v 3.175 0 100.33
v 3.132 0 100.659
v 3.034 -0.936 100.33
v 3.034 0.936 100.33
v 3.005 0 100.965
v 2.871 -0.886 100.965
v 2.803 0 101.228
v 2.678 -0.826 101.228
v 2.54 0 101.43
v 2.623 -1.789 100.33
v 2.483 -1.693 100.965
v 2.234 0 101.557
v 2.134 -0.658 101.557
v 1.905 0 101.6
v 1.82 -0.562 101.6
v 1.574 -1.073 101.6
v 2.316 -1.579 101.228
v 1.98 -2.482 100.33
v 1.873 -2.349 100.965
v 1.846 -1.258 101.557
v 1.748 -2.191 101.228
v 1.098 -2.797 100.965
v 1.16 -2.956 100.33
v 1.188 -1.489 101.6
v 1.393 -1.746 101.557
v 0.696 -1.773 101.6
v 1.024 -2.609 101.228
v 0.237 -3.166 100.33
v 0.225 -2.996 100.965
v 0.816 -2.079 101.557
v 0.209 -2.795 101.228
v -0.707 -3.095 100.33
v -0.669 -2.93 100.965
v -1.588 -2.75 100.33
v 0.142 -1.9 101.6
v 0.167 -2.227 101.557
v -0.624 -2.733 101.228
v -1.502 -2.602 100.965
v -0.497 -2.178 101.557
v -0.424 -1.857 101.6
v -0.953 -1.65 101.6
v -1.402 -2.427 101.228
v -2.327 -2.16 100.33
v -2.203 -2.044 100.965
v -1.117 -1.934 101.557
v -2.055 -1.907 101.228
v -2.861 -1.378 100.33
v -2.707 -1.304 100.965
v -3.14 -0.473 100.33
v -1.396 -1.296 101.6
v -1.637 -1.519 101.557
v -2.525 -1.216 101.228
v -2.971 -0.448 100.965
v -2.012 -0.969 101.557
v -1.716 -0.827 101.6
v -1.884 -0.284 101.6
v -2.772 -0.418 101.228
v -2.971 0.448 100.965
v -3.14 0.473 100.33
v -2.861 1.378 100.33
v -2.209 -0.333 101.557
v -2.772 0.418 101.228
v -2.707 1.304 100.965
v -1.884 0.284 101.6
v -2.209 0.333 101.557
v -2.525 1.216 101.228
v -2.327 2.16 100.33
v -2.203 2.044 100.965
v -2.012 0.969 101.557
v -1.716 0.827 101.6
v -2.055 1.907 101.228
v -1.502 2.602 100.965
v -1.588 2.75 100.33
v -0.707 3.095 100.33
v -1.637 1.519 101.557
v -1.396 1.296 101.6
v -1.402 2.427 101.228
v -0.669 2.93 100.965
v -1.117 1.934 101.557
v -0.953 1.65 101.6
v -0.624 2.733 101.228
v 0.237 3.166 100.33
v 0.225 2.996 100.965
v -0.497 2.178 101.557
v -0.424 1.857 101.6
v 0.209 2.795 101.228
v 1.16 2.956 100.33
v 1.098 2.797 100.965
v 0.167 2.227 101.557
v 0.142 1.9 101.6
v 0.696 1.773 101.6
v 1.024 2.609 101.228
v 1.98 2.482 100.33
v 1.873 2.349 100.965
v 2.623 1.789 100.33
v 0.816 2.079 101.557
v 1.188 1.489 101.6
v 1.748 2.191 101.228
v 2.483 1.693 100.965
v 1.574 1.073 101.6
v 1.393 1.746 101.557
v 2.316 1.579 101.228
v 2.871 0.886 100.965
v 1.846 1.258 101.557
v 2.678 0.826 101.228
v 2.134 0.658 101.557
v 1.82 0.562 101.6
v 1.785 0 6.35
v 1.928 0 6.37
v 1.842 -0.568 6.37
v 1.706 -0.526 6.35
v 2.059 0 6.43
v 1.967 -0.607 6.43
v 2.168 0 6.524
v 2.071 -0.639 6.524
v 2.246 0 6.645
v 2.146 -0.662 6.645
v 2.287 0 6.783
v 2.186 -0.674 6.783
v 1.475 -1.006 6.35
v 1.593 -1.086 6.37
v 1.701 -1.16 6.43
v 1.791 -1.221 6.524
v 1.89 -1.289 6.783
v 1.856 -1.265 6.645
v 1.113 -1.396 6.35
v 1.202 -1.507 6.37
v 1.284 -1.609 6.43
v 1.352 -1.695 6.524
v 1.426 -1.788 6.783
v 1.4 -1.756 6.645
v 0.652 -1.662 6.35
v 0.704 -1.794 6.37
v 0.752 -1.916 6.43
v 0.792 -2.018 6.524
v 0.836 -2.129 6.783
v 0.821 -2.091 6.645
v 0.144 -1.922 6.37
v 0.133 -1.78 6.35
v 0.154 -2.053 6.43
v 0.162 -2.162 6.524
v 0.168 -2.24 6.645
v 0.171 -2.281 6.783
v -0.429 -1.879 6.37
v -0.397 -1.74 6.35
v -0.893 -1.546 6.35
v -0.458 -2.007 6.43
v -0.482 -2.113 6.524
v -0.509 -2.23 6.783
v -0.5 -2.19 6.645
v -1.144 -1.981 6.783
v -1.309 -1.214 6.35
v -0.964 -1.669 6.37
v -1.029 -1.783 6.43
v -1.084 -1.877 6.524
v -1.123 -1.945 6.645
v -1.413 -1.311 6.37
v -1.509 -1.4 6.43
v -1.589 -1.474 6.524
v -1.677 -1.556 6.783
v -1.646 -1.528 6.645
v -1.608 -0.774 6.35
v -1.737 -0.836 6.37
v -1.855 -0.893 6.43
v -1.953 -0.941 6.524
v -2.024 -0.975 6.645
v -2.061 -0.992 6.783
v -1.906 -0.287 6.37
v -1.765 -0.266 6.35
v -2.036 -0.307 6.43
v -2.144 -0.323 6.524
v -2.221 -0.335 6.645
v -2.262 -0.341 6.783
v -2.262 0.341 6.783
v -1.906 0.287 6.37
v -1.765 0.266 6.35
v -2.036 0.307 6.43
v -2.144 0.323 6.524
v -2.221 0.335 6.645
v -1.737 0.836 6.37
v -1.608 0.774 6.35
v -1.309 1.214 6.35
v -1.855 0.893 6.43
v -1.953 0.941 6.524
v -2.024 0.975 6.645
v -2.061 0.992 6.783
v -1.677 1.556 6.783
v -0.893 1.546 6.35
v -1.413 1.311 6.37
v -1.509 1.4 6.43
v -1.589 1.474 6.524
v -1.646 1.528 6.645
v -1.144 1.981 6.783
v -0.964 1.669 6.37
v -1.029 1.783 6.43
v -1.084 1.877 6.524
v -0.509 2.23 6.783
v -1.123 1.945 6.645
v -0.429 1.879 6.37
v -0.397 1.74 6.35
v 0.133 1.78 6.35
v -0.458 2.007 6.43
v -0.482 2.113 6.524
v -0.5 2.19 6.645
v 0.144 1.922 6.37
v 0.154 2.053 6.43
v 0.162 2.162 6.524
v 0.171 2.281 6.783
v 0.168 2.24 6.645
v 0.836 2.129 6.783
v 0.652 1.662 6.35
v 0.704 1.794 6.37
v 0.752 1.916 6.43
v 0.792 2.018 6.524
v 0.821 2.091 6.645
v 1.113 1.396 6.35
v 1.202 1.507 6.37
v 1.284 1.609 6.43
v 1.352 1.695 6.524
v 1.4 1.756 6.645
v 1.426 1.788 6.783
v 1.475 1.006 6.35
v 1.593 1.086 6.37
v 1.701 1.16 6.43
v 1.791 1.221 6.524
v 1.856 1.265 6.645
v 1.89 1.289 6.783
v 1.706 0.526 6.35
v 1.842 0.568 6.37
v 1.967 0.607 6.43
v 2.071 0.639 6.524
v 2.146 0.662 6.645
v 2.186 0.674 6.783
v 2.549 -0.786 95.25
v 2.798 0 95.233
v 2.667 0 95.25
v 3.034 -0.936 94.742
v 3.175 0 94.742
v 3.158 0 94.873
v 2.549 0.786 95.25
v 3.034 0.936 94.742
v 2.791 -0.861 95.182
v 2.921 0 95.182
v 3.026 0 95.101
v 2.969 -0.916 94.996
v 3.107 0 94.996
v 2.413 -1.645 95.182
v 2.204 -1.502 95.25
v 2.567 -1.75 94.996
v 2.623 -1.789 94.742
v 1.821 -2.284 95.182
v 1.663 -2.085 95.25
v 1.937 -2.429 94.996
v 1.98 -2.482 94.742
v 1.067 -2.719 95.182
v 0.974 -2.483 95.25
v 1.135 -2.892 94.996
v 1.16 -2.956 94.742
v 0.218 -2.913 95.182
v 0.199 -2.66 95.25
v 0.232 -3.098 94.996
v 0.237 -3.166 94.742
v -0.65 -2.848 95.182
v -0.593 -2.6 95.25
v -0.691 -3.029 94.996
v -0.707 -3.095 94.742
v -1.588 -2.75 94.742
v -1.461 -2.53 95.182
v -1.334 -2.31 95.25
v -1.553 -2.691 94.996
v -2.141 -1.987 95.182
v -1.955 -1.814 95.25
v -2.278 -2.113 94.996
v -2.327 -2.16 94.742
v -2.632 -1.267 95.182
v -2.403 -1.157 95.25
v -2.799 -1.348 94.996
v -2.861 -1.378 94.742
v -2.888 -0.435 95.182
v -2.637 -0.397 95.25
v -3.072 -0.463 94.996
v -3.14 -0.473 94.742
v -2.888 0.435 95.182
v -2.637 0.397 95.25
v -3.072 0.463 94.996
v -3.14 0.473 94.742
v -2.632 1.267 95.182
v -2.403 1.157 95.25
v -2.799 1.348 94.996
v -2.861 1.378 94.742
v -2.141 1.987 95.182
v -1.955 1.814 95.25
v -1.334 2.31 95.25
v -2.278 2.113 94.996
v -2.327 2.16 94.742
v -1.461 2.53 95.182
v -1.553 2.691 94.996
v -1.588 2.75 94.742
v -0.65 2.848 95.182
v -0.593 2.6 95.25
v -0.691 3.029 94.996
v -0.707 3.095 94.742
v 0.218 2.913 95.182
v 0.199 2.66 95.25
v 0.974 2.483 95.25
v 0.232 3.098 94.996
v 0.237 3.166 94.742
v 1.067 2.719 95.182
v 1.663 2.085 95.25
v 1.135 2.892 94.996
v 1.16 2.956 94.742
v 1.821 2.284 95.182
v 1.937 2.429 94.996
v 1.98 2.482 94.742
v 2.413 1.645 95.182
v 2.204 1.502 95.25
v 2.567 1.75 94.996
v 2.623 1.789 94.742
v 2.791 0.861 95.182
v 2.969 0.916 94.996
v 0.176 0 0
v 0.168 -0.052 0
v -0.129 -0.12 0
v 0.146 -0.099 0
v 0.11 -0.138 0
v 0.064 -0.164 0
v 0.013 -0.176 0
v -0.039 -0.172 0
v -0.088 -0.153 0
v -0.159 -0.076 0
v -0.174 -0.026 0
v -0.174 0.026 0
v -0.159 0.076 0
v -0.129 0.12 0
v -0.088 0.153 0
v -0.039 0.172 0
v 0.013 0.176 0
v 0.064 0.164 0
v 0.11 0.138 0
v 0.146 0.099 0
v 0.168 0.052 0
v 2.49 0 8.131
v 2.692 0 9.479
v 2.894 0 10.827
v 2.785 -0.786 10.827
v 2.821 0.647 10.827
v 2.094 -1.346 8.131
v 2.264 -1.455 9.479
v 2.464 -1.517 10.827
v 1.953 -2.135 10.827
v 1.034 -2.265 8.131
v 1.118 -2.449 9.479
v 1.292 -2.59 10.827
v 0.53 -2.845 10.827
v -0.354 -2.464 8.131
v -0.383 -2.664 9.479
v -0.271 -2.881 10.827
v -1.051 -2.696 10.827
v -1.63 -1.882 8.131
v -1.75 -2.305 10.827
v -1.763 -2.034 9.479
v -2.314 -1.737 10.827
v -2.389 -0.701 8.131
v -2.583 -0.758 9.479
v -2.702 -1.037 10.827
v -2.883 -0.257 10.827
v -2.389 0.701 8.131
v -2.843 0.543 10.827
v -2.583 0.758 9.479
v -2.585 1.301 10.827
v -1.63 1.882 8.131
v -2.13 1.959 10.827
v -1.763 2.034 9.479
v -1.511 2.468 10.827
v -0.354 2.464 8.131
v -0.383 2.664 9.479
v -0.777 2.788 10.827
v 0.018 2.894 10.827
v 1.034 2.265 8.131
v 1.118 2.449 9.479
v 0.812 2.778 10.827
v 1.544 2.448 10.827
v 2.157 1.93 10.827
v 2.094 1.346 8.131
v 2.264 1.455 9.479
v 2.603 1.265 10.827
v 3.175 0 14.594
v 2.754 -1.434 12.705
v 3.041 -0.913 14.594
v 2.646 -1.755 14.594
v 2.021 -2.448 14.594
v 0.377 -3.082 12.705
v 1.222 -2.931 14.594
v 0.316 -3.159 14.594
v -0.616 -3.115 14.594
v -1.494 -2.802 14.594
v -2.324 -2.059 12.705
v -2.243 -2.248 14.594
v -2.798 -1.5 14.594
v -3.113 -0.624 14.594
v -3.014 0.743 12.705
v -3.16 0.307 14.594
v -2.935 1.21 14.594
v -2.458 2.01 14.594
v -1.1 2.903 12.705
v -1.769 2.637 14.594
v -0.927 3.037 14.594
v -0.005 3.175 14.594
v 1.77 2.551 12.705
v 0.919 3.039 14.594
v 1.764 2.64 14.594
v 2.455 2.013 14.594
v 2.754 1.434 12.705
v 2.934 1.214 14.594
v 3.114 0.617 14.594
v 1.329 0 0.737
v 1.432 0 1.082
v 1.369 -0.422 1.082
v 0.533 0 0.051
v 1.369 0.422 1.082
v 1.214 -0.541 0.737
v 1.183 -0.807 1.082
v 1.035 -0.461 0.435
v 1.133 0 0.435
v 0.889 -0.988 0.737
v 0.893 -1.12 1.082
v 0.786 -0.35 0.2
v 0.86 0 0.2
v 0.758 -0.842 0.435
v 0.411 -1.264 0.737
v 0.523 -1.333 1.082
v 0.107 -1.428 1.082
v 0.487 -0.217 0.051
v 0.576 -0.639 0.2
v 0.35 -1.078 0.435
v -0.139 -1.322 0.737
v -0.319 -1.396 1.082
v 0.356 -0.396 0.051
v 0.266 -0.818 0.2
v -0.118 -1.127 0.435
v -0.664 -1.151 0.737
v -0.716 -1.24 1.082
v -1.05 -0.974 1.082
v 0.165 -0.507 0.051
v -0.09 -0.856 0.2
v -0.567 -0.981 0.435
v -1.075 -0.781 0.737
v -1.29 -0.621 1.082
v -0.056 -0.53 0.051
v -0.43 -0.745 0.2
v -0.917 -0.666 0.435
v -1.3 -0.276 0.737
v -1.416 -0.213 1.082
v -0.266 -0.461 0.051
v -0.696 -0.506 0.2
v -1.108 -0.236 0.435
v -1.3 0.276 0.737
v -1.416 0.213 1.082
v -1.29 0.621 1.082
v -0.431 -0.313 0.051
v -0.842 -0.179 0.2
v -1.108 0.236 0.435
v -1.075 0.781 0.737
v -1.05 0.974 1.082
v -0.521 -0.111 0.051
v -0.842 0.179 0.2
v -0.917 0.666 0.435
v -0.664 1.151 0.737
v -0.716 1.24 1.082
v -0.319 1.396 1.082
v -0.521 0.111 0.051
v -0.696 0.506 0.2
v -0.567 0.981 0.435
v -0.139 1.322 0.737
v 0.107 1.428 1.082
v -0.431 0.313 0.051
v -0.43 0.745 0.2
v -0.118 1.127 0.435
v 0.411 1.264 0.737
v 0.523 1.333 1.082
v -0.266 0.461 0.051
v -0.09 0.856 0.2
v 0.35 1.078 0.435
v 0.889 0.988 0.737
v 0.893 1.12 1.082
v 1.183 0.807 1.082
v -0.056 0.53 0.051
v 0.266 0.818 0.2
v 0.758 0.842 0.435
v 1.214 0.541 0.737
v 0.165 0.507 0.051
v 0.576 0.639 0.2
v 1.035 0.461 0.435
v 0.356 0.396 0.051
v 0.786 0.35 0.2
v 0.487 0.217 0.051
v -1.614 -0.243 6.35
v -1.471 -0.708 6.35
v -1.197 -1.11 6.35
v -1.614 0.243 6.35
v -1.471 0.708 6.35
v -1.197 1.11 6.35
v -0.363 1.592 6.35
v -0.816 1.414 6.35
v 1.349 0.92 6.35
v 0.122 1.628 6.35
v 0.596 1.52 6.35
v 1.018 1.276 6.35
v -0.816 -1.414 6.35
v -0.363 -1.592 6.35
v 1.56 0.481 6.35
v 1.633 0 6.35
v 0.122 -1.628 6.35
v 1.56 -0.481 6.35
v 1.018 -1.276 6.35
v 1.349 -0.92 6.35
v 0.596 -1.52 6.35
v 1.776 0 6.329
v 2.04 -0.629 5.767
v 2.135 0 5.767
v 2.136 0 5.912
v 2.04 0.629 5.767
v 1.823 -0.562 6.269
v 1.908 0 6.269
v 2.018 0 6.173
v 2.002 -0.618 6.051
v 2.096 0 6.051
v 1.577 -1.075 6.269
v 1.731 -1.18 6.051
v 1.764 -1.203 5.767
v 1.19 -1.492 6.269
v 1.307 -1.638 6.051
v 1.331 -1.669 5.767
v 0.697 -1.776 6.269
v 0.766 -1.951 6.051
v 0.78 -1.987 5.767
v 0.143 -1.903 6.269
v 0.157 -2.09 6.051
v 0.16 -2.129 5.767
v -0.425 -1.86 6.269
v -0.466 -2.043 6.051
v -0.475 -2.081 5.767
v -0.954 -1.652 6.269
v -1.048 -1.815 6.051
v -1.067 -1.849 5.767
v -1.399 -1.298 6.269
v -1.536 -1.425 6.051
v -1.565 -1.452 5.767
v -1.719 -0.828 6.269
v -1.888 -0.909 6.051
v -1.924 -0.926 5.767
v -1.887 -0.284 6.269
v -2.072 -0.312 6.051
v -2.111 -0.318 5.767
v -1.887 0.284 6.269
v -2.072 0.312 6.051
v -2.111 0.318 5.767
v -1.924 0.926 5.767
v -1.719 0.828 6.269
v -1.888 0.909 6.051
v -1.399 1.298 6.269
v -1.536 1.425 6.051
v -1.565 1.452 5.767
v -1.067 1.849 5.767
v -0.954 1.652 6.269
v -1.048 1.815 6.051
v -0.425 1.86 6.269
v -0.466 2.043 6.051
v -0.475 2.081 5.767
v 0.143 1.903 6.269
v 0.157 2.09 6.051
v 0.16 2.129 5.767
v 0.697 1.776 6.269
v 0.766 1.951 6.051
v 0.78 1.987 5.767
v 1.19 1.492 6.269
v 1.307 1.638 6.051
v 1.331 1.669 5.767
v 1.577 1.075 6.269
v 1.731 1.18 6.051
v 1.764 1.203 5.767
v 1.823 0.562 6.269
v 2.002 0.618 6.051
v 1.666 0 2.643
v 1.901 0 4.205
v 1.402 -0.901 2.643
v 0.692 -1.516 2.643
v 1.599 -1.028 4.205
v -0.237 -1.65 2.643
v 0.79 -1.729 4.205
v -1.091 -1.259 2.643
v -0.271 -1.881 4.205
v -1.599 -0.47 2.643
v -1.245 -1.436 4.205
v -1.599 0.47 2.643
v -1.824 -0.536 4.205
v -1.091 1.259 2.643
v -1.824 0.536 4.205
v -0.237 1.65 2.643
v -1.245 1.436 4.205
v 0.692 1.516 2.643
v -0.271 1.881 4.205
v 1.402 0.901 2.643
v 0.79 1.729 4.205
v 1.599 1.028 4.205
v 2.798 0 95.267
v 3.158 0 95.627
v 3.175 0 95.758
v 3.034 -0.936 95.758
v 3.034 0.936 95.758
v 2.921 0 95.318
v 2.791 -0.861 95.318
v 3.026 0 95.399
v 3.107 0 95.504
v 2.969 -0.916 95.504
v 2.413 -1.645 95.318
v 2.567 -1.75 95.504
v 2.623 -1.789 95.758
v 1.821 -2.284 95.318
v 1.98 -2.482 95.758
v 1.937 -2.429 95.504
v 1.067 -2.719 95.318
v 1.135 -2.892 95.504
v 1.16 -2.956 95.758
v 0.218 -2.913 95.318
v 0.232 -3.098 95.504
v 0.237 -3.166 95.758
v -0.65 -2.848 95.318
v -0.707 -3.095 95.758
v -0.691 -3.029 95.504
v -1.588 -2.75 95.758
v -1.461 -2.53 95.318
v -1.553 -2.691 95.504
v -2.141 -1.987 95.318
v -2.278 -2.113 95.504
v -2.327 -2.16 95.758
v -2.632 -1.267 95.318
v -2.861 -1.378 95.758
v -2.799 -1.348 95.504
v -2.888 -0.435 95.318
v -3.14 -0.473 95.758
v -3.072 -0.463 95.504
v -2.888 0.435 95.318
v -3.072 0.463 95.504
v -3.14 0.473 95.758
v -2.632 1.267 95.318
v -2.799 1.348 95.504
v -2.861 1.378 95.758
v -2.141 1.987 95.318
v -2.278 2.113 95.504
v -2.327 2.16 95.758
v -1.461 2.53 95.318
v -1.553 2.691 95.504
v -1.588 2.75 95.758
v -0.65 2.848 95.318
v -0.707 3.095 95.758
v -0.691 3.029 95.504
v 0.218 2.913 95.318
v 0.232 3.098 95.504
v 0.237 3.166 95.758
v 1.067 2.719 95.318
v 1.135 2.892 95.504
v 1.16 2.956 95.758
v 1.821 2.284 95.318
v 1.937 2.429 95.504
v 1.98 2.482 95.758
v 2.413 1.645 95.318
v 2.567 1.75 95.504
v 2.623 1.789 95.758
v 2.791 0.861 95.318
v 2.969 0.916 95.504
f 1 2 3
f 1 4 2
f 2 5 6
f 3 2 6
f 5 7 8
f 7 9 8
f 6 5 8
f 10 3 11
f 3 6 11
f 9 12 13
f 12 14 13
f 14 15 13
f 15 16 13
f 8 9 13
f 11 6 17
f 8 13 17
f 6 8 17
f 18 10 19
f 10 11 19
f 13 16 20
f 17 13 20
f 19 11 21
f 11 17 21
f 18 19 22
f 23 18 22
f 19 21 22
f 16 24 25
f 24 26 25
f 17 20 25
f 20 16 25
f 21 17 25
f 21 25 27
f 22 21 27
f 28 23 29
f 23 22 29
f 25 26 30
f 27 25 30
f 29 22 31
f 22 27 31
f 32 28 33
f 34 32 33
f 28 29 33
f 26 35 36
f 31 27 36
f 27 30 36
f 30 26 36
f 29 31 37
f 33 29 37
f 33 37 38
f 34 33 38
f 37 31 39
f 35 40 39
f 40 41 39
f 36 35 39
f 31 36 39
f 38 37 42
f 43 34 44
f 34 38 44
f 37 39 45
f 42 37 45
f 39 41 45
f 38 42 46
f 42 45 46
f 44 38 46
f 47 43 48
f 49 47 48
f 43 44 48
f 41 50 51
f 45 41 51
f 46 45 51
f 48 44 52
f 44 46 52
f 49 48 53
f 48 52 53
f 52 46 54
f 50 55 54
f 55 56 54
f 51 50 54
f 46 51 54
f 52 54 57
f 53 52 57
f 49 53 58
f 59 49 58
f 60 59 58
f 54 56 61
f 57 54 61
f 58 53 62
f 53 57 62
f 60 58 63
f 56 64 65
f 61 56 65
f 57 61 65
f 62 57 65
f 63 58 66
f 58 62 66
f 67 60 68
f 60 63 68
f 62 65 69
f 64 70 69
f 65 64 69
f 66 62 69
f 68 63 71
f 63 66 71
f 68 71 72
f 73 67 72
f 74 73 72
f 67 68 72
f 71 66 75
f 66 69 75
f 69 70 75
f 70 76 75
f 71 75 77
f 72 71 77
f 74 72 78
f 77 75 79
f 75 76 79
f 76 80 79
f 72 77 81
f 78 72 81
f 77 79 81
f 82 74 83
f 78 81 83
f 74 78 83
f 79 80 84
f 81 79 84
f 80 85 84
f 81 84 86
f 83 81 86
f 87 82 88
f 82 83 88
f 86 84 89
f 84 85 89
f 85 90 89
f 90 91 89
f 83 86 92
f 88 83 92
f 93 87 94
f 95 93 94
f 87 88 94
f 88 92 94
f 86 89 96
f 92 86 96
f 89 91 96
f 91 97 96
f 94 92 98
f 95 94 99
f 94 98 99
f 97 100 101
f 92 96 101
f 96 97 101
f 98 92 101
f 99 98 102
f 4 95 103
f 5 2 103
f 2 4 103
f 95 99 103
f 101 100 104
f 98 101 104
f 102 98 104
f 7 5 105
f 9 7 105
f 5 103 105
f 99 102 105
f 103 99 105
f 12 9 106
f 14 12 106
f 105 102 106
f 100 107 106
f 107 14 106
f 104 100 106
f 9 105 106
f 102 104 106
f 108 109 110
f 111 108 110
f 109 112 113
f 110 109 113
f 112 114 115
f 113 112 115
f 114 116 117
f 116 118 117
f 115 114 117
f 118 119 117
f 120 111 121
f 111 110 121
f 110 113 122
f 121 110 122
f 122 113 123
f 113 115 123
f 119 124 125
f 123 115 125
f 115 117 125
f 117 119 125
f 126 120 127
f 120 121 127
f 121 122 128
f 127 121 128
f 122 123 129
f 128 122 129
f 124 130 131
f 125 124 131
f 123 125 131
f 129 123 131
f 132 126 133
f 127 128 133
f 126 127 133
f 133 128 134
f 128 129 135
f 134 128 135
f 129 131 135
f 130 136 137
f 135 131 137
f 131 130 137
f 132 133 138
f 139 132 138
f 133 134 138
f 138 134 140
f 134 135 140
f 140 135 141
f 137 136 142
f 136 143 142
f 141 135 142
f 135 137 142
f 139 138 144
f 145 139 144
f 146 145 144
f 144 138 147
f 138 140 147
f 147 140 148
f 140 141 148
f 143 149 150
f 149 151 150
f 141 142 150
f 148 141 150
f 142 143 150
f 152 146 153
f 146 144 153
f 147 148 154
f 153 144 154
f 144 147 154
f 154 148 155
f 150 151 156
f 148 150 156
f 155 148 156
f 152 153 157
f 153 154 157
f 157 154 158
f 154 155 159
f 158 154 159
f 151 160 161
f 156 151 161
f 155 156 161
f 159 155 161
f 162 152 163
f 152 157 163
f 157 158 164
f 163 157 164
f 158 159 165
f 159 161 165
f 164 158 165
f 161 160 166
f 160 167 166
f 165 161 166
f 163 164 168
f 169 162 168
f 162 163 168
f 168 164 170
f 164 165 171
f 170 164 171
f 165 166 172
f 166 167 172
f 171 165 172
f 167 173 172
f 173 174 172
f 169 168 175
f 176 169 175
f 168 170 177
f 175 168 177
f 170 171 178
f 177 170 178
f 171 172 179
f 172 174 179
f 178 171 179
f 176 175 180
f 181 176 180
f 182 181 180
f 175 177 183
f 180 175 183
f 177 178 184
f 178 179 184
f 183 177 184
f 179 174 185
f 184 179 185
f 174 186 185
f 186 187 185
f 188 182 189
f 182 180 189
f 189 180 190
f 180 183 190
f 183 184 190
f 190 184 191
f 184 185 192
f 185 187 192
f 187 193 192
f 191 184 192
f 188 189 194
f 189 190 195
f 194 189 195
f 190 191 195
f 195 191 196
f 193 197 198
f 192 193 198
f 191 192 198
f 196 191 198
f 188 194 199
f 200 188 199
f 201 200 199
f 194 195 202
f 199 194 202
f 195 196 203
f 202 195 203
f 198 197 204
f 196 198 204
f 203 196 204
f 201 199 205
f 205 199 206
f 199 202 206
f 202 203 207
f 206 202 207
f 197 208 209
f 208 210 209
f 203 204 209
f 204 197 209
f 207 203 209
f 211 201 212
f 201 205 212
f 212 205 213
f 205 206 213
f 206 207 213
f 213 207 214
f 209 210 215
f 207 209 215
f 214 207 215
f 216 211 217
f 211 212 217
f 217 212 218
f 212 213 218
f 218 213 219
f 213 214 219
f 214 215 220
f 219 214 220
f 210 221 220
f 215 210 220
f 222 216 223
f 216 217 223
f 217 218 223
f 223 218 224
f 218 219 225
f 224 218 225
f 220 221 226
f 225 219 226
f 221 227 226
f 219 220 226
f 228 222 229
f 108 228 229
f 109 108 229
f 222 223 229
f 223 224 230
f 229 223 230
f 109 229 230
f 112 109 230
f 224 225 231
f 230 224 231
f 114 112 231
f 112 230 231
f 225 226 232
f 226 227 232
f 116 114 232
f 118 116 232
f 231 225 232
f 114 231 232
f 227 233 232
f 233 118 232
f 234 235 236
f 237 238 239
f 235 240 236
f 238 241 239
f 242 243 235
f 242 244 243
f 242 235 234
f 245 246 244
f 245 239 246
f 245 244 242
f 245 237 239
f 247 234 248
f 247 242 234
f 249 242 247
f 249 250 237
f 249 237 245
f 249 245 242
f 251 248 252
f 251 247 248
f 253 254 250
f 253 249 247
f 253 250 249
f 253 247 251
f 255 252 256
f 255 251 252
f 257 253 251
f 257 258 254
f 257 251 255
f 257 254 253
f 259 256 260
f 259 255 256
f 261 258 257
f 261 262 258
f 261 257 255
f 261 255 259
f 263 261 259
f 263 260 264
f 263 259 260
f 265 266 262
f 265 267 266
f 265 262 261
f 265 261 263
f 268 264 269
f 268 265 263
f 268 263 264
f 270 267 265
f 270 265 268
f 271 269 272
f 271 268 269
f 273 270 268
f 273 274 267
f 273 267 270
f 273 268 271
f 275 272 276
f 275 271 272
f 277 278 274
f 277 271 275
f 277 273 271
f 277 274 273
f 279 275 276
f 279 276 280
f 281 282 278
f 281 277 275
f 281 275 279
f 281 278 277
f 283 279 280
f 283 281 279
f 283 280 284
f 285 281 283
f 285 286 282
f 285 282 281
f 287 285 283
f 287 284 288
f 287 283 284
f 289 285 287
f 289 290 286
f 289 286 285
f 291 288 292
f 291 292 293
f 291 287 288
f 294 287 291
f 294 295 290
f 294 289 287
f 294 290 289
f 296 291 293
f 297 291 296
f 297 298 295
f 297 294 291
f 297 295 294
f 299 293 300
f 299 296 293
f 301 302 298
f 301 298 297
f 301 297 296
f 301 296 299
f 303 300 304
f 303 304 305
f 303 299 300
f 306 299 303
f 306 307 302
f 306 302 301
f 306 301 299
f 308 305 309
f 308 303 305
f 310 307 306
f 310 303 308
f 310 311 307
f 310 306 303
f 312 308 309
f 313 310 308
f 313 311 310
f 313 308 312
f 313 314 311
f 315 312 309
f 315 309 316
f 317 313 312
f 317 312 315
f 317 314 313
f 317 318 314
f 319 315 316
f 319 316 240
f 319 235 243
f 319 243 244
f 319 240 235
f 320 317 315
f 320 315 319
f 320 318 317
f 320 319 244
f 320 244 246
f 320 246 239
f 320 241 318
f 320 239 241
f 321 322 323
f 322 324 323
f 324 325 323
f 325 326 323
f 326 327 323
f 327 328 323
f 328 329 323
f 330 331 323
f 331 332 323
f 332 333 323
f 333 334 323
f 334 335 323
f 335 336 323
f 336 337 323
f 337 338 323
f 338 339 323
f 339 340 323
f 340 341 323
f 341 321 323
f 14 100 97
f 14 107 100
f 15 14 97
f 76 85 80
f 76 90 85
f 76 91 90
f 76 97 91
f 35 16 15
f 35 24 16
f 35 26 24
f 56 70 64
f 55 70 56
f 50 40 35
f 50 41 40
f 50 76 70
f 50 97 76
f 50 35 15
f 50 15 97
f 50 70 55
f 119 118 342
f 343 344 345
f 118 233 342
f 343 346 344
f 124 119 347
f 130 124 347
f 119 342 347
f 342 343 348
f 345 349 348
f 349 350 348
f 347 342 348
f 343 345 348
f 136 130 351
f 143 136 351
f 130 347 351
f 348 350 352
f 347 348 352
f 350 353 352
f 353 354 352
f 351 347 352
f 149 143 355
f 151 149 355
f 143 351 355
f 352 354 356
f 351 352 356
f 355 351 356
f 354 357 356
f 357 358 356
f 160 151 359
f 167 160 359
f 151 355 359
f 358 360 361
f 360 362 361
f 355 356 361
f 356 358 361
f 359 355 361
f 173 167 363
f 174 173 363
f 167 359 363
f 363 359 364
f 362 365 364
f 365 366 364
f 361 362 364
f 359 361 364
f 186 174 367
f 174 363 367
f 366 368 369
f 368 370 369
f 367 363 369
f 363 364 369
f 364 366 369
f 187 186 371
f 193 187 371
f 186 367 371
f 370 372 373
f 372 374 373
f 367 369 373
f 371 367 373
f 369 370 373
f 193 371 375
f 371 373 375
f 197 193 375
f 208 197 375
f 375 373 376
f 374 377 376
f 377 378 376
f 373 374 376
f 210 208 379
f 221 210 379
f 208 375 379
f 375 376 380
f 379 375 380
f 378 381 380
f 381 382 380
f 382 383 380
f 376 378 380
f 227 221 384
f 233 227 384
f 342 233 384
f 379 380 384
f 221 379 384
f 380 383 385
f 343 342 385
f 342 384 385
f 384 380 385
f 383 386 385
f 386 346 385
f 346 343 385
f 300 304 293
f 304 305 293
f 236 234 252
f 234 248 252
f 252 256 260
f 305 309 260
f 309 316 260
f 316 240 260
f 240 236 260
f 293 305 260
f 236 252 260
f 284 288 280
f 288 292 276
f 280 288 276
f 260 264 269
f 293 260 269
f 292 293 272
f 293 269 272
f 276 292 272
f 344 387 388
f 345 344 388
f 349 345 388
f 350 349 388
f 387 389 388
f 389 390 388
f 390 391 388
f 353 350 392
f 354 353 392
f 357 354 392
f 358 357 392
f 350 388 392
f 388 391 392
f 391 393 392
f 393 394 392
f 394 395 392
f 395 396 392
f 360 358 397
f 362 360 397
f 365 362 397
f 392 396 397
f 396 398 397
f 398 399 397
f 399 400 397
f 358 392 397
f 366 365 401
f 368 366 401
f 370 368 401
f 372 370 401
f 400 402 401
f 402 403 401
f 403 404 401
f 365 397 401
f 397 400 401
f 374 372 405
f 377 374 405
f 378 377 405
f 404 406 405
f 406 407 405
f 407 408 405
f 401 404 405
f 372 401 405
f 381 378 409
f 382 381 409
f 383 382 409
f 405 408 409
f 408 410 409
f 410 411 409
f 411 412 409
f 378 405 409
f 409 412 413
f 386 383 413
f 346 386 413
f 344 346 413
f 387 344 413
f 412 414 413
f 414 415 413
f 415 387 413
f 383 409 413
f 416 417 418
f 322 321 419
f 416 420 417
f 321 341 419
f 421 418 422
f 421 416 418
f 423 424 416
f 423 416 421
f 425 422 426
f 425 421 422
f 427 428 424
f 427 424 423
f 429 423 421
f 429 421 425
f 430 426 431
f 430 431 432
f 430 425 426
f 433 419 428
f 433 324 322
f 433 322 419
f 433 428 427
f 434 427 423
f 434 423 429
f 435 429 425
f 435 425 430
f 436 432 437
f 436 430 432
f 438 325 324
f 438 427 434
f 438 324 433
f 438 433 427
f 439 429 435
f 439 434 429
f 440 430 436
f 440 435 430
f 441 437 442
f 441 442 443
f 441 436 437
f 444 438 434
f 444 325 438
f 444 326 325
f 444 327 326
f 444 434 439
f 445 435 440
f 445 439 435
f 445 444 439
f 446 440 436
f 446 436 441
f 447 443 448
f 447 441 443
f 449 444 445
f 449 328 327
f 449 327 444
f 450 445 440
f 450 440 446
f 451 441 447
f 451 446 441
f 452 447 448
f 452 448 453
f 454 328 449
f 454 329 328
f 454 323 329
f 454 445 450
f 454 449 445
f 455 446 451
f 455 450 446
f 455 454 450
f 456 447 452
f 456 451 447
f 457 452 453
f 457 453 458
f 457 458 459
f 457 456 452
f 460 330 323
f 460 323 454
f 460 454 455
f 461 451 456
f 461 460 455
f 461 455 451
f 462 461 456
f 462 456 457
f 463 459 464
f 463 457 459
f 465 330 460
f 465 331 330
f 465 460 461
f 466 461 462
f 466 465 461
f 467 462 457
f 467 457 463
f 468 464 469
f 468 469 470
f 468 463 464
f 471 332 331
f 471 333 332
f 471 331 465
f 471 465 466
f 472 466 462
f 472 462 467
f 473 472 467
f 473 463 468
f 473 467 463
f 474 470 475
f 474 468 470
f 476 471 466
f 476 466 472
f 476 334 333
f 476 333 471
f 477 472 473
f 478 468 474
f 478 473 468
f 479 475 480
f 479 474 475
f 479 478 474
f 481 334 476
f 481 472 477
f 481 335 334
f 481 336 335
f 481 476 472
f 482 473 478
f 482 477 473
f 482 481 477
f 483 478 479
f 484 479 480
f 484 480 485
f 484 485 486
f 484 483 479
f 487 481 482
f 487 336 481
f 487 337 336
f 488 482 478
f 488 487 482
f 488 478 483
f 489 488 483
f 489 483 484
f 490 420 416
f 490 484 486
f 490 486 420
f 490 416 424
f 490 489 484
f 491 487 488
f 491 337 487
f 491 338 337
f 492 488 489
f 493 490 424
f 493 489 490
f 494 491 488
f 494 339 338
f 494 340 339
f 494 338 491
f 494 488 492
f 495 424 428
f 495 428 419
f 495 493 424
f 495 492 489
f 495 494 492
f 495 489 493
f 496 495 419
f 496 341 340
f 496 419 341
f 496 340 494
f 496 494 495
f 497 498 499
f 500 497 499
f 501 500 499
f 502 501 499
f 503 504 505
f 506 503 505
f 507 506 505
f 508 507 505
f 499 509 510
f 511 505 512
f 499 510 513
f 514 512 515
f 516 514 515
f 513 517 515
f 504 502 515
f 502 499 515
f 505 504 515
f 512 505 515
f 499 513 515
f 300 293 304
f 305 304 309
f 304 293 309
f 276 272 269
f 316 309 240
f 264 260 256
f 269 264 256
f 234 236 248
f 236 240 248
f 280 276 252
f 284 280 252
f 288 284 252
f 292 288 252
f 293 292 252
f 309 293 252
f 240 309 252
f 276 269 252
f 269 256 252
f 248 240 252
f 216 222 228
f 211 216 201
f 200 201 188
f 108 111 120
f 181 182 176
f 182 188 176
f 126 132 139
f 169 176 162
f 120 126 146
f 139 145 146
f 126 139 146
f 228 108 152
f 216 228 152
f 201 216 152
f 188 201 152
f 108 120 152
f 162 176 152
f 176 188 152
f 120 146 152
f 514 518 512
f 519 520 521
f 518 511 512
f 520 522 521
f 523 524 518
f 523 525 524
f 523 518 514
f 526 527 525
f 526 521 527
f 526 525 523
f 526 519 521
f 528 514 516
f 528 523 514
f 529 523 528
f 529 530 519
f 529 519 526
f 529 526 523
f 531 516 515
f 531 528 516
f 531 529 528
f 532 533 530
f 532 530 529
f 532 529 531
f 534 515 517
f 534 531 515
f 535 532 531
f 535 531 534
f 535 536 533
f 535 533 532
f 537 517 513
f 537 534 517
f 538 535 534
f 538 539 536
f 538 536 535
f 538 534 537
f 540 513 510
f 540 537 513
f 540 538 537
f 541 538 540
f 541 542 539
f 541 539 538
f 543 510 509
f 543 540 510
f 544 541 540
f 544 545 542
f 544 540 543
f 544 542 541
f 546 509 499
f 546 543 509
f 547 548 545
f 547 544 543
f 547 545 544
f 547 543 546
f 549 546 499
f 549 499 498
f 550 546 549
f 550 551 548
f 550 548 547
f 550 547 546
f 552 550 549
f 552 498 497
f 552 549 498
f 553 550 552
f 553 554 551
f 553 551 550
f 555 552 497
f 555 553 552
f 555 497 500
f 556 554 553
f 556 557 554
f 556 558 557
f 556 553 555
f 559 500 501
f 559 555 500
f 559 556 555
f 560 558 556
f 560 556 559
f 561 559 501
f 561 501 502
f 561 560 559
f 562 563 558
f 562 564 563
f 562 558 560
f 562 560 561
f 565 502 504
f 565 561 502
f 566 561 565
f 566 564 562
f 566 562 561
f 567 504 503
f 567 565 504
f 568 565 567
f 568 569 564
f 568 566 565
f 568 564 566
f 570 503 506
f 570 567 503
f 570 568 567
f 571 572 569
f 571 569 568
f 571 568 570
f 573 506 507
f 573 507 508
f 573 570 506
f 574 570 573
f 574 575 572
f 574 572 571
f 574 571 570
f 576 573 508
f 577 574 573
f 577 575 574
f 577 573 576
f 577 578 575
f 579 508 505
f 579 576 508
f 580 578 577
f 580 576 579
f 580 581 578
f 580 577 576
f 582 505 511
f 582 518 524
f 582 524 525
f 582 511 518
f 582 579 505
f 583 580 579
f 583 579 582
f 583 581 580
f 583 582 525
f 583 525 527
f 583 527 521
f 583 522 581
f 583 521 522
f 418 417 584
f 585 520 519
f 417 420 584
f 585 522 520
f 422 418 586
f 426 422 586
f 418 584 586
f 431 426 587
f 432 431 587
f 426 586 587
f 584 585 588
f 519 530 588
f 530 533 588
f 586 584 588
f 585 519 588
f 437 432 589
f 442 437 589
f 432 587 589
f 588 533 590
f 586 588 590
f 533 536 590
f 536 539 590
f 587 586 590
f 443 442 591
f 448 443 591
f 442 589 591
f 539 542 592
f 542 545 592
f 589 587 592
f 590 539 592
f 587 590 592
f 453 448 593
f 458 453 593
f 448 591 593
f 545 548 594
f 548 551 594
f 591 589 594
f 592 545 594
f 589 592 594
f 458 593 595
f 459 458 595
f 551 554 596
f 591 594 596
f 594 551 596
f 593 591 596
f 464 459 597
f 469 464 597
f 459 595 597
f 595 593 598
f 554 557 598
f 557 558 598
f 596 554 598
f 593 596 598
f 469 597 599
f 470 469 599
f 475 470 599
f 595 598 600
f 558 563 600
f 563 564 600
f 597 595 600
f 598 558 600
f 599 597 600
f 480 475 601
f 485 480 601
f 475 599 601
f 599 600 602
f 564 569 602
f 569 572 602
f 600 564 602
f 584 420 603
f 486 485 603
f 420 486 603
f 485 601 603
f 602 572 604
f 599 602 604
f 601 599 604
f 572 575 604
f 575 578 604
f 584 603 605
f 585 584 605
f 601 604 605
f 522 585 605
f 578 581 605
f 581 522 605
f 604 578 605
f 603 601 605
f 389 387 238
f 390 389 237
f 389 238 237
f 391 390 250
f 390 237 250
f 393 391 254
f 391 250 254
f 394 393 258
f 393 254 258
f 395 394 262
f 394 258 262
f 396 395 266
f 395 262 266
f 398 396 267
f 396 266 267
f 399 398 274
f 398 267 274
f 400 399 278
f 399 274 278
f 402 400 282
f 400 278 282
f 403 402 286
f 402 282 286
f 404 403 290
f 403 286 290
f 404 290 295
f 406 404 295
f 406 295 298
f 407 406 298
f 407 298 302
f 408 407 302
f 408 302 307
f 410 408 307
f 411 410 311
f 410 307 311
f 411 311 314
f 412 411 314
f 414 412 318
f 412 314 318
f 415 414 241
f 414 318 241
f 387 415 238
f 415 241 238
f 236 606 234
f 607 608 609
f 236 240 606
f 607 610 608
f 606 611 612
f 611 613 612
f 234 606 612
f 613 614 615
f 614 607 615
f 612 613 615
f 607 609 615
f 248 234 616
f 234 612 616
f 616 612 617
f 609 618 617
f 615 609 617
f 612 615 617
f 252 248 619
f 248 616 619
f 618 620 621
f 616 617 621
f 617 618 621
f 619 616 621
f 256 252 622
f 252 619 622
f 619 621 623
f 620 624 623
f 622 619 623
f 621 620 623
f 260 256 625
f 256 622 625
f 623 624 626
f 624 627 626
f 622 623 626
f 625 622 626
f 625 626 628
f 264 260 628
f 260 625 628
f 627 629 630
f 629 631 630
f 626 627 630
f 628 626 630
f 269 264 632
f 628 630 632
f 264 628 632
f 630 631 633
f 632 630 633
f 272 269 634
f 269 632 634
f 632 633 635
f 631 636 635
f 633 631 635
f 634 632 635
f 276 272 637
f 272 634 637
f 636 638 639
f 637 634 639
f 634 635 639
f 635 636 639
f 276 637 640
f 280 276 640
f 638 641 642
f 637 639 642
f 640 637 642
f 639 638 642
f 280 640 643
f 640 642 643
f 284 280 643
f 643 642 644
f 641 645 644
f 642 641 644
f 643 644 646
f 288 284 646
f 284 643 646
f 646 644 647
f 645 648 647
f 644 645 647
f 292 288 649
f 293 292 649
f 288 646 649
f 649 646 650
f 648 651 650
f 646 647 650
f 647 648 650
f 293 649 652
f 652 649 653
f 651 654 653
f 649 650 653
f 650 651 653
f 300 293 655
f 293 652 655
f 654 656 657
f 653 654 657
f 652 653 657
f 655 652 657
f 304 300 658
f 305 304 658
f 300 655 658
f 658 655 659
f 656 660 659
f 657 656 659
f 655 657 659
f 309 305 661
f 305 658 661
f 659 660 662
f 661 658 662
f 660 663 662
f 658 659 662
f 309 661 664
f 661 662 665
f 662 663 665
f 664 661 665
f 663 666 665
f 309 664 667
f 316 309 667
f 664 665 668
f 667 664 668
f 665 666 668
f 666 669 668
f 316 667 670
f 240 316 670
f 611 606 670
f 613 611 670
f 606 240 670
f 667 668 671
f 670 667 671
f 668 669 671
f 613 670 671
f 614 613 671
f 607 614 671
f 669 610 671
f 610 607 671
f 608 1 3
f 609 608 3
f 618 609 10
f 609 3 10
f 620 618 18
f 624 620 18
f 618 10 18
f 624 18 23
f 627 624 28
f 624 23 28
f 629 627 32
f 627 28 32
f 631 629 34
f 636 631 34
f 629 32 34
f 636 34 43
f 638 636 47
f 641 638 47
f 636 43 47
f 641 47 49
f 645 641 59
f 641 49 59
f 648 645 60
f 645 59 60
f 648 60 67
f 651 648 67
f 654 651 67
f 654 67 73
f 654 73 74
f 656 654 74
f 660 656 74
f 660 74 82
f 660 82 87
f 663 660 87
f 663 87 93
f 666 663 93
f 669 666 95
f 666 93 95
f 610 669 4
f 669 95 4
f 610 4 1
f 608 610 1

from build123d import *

# Parameters (mm, degrees)
F0_W   = 3.175
F0_H   = 6.35
F3_R   = 0.508
F3_2_R = 0.508
F3_3_R = 0.508
F4_R   = 1.27
F4_2_R = 1.27
F5_R   = 25.4


with BuildPart() as f1:
    # F0 (on Front) → F1 (revolve)
    with BuildSketch(Plane.XZ):
        Polygon((3.175, 95.25), (0, 95.25), (0, 6.35), (2.2225, 6.35), (3.175, 12.7), align=None)
    revolve(axis=Axis((0, 0, 50.8), (0, 0, -1)))

    # F3
    f3_edges = [f1.edges().sort_by_distance(p)[0] for p in [
        (-2.2225, 0, 6.35),
        (-3.175, 0, 95.25),
    ]]
    fillet(f3_edges, radius=F3_R)

    # F5
    f5_edges = [f1.edges().sort_by_distance(p)[0] for p in [
        (-3.175, 0, 12.7),
    ]]
    fillet(f5_edges, radius=F5_R)


with BuildPart() as f2:
    # F0 (on Front) → F2 (revolve)
    with BuildSketch(Plane.XZ):
        with Locations((1.5875, 98.425)):
            Rectangle(F0_W, F0_H)
    revolve(axis=Axis((0, 0, 50.8), (0, 0, -1)))

    # F3#3
    f3_3_edges = [f2.edges().sort_by_distance(p)[0] for p in [
        (-3.175, 0, 95.25),
    ]]
    fillet(f3_3_edges, radius=F3_3_R)

    # F4
    f4_edges = [f2.edges().sort_by_distance(p)[0] for p in [
        (-3.175, 0, 101.6),
    ]]
    fillet(f4_edges, radius=F4_R)


with BuildPart() as f2b:
    # F0 (on Front) → F2, piece 2 (revolve)
    with BuildSketch(Plane.XZ):
        Polygon((2.2225, 6.35), (0, 6.35), (0, 0), (1.27, 0), align=None)
    revolve(axis=Axis((0, 0, 50.8), (0, 0, -1)))

    # F3#2
    f3_2_edges = [f2b.edges().sort_by_distance(p)[0] for p in [
        (-2.2225, 0, 6.35),
    ]]
    fillet(f3_2_edges, radius=F3_2_R)

    # F4#2
    f4_2_edges = [f2b.edges().sort_by_distance(p)[0] for p in [
        (-1.27, 0, 0),
    ]]
    fillet(f4_2_edges, radius=F4_2_R)


solid = Compound([f1.part, f2.part, f2b.part])
